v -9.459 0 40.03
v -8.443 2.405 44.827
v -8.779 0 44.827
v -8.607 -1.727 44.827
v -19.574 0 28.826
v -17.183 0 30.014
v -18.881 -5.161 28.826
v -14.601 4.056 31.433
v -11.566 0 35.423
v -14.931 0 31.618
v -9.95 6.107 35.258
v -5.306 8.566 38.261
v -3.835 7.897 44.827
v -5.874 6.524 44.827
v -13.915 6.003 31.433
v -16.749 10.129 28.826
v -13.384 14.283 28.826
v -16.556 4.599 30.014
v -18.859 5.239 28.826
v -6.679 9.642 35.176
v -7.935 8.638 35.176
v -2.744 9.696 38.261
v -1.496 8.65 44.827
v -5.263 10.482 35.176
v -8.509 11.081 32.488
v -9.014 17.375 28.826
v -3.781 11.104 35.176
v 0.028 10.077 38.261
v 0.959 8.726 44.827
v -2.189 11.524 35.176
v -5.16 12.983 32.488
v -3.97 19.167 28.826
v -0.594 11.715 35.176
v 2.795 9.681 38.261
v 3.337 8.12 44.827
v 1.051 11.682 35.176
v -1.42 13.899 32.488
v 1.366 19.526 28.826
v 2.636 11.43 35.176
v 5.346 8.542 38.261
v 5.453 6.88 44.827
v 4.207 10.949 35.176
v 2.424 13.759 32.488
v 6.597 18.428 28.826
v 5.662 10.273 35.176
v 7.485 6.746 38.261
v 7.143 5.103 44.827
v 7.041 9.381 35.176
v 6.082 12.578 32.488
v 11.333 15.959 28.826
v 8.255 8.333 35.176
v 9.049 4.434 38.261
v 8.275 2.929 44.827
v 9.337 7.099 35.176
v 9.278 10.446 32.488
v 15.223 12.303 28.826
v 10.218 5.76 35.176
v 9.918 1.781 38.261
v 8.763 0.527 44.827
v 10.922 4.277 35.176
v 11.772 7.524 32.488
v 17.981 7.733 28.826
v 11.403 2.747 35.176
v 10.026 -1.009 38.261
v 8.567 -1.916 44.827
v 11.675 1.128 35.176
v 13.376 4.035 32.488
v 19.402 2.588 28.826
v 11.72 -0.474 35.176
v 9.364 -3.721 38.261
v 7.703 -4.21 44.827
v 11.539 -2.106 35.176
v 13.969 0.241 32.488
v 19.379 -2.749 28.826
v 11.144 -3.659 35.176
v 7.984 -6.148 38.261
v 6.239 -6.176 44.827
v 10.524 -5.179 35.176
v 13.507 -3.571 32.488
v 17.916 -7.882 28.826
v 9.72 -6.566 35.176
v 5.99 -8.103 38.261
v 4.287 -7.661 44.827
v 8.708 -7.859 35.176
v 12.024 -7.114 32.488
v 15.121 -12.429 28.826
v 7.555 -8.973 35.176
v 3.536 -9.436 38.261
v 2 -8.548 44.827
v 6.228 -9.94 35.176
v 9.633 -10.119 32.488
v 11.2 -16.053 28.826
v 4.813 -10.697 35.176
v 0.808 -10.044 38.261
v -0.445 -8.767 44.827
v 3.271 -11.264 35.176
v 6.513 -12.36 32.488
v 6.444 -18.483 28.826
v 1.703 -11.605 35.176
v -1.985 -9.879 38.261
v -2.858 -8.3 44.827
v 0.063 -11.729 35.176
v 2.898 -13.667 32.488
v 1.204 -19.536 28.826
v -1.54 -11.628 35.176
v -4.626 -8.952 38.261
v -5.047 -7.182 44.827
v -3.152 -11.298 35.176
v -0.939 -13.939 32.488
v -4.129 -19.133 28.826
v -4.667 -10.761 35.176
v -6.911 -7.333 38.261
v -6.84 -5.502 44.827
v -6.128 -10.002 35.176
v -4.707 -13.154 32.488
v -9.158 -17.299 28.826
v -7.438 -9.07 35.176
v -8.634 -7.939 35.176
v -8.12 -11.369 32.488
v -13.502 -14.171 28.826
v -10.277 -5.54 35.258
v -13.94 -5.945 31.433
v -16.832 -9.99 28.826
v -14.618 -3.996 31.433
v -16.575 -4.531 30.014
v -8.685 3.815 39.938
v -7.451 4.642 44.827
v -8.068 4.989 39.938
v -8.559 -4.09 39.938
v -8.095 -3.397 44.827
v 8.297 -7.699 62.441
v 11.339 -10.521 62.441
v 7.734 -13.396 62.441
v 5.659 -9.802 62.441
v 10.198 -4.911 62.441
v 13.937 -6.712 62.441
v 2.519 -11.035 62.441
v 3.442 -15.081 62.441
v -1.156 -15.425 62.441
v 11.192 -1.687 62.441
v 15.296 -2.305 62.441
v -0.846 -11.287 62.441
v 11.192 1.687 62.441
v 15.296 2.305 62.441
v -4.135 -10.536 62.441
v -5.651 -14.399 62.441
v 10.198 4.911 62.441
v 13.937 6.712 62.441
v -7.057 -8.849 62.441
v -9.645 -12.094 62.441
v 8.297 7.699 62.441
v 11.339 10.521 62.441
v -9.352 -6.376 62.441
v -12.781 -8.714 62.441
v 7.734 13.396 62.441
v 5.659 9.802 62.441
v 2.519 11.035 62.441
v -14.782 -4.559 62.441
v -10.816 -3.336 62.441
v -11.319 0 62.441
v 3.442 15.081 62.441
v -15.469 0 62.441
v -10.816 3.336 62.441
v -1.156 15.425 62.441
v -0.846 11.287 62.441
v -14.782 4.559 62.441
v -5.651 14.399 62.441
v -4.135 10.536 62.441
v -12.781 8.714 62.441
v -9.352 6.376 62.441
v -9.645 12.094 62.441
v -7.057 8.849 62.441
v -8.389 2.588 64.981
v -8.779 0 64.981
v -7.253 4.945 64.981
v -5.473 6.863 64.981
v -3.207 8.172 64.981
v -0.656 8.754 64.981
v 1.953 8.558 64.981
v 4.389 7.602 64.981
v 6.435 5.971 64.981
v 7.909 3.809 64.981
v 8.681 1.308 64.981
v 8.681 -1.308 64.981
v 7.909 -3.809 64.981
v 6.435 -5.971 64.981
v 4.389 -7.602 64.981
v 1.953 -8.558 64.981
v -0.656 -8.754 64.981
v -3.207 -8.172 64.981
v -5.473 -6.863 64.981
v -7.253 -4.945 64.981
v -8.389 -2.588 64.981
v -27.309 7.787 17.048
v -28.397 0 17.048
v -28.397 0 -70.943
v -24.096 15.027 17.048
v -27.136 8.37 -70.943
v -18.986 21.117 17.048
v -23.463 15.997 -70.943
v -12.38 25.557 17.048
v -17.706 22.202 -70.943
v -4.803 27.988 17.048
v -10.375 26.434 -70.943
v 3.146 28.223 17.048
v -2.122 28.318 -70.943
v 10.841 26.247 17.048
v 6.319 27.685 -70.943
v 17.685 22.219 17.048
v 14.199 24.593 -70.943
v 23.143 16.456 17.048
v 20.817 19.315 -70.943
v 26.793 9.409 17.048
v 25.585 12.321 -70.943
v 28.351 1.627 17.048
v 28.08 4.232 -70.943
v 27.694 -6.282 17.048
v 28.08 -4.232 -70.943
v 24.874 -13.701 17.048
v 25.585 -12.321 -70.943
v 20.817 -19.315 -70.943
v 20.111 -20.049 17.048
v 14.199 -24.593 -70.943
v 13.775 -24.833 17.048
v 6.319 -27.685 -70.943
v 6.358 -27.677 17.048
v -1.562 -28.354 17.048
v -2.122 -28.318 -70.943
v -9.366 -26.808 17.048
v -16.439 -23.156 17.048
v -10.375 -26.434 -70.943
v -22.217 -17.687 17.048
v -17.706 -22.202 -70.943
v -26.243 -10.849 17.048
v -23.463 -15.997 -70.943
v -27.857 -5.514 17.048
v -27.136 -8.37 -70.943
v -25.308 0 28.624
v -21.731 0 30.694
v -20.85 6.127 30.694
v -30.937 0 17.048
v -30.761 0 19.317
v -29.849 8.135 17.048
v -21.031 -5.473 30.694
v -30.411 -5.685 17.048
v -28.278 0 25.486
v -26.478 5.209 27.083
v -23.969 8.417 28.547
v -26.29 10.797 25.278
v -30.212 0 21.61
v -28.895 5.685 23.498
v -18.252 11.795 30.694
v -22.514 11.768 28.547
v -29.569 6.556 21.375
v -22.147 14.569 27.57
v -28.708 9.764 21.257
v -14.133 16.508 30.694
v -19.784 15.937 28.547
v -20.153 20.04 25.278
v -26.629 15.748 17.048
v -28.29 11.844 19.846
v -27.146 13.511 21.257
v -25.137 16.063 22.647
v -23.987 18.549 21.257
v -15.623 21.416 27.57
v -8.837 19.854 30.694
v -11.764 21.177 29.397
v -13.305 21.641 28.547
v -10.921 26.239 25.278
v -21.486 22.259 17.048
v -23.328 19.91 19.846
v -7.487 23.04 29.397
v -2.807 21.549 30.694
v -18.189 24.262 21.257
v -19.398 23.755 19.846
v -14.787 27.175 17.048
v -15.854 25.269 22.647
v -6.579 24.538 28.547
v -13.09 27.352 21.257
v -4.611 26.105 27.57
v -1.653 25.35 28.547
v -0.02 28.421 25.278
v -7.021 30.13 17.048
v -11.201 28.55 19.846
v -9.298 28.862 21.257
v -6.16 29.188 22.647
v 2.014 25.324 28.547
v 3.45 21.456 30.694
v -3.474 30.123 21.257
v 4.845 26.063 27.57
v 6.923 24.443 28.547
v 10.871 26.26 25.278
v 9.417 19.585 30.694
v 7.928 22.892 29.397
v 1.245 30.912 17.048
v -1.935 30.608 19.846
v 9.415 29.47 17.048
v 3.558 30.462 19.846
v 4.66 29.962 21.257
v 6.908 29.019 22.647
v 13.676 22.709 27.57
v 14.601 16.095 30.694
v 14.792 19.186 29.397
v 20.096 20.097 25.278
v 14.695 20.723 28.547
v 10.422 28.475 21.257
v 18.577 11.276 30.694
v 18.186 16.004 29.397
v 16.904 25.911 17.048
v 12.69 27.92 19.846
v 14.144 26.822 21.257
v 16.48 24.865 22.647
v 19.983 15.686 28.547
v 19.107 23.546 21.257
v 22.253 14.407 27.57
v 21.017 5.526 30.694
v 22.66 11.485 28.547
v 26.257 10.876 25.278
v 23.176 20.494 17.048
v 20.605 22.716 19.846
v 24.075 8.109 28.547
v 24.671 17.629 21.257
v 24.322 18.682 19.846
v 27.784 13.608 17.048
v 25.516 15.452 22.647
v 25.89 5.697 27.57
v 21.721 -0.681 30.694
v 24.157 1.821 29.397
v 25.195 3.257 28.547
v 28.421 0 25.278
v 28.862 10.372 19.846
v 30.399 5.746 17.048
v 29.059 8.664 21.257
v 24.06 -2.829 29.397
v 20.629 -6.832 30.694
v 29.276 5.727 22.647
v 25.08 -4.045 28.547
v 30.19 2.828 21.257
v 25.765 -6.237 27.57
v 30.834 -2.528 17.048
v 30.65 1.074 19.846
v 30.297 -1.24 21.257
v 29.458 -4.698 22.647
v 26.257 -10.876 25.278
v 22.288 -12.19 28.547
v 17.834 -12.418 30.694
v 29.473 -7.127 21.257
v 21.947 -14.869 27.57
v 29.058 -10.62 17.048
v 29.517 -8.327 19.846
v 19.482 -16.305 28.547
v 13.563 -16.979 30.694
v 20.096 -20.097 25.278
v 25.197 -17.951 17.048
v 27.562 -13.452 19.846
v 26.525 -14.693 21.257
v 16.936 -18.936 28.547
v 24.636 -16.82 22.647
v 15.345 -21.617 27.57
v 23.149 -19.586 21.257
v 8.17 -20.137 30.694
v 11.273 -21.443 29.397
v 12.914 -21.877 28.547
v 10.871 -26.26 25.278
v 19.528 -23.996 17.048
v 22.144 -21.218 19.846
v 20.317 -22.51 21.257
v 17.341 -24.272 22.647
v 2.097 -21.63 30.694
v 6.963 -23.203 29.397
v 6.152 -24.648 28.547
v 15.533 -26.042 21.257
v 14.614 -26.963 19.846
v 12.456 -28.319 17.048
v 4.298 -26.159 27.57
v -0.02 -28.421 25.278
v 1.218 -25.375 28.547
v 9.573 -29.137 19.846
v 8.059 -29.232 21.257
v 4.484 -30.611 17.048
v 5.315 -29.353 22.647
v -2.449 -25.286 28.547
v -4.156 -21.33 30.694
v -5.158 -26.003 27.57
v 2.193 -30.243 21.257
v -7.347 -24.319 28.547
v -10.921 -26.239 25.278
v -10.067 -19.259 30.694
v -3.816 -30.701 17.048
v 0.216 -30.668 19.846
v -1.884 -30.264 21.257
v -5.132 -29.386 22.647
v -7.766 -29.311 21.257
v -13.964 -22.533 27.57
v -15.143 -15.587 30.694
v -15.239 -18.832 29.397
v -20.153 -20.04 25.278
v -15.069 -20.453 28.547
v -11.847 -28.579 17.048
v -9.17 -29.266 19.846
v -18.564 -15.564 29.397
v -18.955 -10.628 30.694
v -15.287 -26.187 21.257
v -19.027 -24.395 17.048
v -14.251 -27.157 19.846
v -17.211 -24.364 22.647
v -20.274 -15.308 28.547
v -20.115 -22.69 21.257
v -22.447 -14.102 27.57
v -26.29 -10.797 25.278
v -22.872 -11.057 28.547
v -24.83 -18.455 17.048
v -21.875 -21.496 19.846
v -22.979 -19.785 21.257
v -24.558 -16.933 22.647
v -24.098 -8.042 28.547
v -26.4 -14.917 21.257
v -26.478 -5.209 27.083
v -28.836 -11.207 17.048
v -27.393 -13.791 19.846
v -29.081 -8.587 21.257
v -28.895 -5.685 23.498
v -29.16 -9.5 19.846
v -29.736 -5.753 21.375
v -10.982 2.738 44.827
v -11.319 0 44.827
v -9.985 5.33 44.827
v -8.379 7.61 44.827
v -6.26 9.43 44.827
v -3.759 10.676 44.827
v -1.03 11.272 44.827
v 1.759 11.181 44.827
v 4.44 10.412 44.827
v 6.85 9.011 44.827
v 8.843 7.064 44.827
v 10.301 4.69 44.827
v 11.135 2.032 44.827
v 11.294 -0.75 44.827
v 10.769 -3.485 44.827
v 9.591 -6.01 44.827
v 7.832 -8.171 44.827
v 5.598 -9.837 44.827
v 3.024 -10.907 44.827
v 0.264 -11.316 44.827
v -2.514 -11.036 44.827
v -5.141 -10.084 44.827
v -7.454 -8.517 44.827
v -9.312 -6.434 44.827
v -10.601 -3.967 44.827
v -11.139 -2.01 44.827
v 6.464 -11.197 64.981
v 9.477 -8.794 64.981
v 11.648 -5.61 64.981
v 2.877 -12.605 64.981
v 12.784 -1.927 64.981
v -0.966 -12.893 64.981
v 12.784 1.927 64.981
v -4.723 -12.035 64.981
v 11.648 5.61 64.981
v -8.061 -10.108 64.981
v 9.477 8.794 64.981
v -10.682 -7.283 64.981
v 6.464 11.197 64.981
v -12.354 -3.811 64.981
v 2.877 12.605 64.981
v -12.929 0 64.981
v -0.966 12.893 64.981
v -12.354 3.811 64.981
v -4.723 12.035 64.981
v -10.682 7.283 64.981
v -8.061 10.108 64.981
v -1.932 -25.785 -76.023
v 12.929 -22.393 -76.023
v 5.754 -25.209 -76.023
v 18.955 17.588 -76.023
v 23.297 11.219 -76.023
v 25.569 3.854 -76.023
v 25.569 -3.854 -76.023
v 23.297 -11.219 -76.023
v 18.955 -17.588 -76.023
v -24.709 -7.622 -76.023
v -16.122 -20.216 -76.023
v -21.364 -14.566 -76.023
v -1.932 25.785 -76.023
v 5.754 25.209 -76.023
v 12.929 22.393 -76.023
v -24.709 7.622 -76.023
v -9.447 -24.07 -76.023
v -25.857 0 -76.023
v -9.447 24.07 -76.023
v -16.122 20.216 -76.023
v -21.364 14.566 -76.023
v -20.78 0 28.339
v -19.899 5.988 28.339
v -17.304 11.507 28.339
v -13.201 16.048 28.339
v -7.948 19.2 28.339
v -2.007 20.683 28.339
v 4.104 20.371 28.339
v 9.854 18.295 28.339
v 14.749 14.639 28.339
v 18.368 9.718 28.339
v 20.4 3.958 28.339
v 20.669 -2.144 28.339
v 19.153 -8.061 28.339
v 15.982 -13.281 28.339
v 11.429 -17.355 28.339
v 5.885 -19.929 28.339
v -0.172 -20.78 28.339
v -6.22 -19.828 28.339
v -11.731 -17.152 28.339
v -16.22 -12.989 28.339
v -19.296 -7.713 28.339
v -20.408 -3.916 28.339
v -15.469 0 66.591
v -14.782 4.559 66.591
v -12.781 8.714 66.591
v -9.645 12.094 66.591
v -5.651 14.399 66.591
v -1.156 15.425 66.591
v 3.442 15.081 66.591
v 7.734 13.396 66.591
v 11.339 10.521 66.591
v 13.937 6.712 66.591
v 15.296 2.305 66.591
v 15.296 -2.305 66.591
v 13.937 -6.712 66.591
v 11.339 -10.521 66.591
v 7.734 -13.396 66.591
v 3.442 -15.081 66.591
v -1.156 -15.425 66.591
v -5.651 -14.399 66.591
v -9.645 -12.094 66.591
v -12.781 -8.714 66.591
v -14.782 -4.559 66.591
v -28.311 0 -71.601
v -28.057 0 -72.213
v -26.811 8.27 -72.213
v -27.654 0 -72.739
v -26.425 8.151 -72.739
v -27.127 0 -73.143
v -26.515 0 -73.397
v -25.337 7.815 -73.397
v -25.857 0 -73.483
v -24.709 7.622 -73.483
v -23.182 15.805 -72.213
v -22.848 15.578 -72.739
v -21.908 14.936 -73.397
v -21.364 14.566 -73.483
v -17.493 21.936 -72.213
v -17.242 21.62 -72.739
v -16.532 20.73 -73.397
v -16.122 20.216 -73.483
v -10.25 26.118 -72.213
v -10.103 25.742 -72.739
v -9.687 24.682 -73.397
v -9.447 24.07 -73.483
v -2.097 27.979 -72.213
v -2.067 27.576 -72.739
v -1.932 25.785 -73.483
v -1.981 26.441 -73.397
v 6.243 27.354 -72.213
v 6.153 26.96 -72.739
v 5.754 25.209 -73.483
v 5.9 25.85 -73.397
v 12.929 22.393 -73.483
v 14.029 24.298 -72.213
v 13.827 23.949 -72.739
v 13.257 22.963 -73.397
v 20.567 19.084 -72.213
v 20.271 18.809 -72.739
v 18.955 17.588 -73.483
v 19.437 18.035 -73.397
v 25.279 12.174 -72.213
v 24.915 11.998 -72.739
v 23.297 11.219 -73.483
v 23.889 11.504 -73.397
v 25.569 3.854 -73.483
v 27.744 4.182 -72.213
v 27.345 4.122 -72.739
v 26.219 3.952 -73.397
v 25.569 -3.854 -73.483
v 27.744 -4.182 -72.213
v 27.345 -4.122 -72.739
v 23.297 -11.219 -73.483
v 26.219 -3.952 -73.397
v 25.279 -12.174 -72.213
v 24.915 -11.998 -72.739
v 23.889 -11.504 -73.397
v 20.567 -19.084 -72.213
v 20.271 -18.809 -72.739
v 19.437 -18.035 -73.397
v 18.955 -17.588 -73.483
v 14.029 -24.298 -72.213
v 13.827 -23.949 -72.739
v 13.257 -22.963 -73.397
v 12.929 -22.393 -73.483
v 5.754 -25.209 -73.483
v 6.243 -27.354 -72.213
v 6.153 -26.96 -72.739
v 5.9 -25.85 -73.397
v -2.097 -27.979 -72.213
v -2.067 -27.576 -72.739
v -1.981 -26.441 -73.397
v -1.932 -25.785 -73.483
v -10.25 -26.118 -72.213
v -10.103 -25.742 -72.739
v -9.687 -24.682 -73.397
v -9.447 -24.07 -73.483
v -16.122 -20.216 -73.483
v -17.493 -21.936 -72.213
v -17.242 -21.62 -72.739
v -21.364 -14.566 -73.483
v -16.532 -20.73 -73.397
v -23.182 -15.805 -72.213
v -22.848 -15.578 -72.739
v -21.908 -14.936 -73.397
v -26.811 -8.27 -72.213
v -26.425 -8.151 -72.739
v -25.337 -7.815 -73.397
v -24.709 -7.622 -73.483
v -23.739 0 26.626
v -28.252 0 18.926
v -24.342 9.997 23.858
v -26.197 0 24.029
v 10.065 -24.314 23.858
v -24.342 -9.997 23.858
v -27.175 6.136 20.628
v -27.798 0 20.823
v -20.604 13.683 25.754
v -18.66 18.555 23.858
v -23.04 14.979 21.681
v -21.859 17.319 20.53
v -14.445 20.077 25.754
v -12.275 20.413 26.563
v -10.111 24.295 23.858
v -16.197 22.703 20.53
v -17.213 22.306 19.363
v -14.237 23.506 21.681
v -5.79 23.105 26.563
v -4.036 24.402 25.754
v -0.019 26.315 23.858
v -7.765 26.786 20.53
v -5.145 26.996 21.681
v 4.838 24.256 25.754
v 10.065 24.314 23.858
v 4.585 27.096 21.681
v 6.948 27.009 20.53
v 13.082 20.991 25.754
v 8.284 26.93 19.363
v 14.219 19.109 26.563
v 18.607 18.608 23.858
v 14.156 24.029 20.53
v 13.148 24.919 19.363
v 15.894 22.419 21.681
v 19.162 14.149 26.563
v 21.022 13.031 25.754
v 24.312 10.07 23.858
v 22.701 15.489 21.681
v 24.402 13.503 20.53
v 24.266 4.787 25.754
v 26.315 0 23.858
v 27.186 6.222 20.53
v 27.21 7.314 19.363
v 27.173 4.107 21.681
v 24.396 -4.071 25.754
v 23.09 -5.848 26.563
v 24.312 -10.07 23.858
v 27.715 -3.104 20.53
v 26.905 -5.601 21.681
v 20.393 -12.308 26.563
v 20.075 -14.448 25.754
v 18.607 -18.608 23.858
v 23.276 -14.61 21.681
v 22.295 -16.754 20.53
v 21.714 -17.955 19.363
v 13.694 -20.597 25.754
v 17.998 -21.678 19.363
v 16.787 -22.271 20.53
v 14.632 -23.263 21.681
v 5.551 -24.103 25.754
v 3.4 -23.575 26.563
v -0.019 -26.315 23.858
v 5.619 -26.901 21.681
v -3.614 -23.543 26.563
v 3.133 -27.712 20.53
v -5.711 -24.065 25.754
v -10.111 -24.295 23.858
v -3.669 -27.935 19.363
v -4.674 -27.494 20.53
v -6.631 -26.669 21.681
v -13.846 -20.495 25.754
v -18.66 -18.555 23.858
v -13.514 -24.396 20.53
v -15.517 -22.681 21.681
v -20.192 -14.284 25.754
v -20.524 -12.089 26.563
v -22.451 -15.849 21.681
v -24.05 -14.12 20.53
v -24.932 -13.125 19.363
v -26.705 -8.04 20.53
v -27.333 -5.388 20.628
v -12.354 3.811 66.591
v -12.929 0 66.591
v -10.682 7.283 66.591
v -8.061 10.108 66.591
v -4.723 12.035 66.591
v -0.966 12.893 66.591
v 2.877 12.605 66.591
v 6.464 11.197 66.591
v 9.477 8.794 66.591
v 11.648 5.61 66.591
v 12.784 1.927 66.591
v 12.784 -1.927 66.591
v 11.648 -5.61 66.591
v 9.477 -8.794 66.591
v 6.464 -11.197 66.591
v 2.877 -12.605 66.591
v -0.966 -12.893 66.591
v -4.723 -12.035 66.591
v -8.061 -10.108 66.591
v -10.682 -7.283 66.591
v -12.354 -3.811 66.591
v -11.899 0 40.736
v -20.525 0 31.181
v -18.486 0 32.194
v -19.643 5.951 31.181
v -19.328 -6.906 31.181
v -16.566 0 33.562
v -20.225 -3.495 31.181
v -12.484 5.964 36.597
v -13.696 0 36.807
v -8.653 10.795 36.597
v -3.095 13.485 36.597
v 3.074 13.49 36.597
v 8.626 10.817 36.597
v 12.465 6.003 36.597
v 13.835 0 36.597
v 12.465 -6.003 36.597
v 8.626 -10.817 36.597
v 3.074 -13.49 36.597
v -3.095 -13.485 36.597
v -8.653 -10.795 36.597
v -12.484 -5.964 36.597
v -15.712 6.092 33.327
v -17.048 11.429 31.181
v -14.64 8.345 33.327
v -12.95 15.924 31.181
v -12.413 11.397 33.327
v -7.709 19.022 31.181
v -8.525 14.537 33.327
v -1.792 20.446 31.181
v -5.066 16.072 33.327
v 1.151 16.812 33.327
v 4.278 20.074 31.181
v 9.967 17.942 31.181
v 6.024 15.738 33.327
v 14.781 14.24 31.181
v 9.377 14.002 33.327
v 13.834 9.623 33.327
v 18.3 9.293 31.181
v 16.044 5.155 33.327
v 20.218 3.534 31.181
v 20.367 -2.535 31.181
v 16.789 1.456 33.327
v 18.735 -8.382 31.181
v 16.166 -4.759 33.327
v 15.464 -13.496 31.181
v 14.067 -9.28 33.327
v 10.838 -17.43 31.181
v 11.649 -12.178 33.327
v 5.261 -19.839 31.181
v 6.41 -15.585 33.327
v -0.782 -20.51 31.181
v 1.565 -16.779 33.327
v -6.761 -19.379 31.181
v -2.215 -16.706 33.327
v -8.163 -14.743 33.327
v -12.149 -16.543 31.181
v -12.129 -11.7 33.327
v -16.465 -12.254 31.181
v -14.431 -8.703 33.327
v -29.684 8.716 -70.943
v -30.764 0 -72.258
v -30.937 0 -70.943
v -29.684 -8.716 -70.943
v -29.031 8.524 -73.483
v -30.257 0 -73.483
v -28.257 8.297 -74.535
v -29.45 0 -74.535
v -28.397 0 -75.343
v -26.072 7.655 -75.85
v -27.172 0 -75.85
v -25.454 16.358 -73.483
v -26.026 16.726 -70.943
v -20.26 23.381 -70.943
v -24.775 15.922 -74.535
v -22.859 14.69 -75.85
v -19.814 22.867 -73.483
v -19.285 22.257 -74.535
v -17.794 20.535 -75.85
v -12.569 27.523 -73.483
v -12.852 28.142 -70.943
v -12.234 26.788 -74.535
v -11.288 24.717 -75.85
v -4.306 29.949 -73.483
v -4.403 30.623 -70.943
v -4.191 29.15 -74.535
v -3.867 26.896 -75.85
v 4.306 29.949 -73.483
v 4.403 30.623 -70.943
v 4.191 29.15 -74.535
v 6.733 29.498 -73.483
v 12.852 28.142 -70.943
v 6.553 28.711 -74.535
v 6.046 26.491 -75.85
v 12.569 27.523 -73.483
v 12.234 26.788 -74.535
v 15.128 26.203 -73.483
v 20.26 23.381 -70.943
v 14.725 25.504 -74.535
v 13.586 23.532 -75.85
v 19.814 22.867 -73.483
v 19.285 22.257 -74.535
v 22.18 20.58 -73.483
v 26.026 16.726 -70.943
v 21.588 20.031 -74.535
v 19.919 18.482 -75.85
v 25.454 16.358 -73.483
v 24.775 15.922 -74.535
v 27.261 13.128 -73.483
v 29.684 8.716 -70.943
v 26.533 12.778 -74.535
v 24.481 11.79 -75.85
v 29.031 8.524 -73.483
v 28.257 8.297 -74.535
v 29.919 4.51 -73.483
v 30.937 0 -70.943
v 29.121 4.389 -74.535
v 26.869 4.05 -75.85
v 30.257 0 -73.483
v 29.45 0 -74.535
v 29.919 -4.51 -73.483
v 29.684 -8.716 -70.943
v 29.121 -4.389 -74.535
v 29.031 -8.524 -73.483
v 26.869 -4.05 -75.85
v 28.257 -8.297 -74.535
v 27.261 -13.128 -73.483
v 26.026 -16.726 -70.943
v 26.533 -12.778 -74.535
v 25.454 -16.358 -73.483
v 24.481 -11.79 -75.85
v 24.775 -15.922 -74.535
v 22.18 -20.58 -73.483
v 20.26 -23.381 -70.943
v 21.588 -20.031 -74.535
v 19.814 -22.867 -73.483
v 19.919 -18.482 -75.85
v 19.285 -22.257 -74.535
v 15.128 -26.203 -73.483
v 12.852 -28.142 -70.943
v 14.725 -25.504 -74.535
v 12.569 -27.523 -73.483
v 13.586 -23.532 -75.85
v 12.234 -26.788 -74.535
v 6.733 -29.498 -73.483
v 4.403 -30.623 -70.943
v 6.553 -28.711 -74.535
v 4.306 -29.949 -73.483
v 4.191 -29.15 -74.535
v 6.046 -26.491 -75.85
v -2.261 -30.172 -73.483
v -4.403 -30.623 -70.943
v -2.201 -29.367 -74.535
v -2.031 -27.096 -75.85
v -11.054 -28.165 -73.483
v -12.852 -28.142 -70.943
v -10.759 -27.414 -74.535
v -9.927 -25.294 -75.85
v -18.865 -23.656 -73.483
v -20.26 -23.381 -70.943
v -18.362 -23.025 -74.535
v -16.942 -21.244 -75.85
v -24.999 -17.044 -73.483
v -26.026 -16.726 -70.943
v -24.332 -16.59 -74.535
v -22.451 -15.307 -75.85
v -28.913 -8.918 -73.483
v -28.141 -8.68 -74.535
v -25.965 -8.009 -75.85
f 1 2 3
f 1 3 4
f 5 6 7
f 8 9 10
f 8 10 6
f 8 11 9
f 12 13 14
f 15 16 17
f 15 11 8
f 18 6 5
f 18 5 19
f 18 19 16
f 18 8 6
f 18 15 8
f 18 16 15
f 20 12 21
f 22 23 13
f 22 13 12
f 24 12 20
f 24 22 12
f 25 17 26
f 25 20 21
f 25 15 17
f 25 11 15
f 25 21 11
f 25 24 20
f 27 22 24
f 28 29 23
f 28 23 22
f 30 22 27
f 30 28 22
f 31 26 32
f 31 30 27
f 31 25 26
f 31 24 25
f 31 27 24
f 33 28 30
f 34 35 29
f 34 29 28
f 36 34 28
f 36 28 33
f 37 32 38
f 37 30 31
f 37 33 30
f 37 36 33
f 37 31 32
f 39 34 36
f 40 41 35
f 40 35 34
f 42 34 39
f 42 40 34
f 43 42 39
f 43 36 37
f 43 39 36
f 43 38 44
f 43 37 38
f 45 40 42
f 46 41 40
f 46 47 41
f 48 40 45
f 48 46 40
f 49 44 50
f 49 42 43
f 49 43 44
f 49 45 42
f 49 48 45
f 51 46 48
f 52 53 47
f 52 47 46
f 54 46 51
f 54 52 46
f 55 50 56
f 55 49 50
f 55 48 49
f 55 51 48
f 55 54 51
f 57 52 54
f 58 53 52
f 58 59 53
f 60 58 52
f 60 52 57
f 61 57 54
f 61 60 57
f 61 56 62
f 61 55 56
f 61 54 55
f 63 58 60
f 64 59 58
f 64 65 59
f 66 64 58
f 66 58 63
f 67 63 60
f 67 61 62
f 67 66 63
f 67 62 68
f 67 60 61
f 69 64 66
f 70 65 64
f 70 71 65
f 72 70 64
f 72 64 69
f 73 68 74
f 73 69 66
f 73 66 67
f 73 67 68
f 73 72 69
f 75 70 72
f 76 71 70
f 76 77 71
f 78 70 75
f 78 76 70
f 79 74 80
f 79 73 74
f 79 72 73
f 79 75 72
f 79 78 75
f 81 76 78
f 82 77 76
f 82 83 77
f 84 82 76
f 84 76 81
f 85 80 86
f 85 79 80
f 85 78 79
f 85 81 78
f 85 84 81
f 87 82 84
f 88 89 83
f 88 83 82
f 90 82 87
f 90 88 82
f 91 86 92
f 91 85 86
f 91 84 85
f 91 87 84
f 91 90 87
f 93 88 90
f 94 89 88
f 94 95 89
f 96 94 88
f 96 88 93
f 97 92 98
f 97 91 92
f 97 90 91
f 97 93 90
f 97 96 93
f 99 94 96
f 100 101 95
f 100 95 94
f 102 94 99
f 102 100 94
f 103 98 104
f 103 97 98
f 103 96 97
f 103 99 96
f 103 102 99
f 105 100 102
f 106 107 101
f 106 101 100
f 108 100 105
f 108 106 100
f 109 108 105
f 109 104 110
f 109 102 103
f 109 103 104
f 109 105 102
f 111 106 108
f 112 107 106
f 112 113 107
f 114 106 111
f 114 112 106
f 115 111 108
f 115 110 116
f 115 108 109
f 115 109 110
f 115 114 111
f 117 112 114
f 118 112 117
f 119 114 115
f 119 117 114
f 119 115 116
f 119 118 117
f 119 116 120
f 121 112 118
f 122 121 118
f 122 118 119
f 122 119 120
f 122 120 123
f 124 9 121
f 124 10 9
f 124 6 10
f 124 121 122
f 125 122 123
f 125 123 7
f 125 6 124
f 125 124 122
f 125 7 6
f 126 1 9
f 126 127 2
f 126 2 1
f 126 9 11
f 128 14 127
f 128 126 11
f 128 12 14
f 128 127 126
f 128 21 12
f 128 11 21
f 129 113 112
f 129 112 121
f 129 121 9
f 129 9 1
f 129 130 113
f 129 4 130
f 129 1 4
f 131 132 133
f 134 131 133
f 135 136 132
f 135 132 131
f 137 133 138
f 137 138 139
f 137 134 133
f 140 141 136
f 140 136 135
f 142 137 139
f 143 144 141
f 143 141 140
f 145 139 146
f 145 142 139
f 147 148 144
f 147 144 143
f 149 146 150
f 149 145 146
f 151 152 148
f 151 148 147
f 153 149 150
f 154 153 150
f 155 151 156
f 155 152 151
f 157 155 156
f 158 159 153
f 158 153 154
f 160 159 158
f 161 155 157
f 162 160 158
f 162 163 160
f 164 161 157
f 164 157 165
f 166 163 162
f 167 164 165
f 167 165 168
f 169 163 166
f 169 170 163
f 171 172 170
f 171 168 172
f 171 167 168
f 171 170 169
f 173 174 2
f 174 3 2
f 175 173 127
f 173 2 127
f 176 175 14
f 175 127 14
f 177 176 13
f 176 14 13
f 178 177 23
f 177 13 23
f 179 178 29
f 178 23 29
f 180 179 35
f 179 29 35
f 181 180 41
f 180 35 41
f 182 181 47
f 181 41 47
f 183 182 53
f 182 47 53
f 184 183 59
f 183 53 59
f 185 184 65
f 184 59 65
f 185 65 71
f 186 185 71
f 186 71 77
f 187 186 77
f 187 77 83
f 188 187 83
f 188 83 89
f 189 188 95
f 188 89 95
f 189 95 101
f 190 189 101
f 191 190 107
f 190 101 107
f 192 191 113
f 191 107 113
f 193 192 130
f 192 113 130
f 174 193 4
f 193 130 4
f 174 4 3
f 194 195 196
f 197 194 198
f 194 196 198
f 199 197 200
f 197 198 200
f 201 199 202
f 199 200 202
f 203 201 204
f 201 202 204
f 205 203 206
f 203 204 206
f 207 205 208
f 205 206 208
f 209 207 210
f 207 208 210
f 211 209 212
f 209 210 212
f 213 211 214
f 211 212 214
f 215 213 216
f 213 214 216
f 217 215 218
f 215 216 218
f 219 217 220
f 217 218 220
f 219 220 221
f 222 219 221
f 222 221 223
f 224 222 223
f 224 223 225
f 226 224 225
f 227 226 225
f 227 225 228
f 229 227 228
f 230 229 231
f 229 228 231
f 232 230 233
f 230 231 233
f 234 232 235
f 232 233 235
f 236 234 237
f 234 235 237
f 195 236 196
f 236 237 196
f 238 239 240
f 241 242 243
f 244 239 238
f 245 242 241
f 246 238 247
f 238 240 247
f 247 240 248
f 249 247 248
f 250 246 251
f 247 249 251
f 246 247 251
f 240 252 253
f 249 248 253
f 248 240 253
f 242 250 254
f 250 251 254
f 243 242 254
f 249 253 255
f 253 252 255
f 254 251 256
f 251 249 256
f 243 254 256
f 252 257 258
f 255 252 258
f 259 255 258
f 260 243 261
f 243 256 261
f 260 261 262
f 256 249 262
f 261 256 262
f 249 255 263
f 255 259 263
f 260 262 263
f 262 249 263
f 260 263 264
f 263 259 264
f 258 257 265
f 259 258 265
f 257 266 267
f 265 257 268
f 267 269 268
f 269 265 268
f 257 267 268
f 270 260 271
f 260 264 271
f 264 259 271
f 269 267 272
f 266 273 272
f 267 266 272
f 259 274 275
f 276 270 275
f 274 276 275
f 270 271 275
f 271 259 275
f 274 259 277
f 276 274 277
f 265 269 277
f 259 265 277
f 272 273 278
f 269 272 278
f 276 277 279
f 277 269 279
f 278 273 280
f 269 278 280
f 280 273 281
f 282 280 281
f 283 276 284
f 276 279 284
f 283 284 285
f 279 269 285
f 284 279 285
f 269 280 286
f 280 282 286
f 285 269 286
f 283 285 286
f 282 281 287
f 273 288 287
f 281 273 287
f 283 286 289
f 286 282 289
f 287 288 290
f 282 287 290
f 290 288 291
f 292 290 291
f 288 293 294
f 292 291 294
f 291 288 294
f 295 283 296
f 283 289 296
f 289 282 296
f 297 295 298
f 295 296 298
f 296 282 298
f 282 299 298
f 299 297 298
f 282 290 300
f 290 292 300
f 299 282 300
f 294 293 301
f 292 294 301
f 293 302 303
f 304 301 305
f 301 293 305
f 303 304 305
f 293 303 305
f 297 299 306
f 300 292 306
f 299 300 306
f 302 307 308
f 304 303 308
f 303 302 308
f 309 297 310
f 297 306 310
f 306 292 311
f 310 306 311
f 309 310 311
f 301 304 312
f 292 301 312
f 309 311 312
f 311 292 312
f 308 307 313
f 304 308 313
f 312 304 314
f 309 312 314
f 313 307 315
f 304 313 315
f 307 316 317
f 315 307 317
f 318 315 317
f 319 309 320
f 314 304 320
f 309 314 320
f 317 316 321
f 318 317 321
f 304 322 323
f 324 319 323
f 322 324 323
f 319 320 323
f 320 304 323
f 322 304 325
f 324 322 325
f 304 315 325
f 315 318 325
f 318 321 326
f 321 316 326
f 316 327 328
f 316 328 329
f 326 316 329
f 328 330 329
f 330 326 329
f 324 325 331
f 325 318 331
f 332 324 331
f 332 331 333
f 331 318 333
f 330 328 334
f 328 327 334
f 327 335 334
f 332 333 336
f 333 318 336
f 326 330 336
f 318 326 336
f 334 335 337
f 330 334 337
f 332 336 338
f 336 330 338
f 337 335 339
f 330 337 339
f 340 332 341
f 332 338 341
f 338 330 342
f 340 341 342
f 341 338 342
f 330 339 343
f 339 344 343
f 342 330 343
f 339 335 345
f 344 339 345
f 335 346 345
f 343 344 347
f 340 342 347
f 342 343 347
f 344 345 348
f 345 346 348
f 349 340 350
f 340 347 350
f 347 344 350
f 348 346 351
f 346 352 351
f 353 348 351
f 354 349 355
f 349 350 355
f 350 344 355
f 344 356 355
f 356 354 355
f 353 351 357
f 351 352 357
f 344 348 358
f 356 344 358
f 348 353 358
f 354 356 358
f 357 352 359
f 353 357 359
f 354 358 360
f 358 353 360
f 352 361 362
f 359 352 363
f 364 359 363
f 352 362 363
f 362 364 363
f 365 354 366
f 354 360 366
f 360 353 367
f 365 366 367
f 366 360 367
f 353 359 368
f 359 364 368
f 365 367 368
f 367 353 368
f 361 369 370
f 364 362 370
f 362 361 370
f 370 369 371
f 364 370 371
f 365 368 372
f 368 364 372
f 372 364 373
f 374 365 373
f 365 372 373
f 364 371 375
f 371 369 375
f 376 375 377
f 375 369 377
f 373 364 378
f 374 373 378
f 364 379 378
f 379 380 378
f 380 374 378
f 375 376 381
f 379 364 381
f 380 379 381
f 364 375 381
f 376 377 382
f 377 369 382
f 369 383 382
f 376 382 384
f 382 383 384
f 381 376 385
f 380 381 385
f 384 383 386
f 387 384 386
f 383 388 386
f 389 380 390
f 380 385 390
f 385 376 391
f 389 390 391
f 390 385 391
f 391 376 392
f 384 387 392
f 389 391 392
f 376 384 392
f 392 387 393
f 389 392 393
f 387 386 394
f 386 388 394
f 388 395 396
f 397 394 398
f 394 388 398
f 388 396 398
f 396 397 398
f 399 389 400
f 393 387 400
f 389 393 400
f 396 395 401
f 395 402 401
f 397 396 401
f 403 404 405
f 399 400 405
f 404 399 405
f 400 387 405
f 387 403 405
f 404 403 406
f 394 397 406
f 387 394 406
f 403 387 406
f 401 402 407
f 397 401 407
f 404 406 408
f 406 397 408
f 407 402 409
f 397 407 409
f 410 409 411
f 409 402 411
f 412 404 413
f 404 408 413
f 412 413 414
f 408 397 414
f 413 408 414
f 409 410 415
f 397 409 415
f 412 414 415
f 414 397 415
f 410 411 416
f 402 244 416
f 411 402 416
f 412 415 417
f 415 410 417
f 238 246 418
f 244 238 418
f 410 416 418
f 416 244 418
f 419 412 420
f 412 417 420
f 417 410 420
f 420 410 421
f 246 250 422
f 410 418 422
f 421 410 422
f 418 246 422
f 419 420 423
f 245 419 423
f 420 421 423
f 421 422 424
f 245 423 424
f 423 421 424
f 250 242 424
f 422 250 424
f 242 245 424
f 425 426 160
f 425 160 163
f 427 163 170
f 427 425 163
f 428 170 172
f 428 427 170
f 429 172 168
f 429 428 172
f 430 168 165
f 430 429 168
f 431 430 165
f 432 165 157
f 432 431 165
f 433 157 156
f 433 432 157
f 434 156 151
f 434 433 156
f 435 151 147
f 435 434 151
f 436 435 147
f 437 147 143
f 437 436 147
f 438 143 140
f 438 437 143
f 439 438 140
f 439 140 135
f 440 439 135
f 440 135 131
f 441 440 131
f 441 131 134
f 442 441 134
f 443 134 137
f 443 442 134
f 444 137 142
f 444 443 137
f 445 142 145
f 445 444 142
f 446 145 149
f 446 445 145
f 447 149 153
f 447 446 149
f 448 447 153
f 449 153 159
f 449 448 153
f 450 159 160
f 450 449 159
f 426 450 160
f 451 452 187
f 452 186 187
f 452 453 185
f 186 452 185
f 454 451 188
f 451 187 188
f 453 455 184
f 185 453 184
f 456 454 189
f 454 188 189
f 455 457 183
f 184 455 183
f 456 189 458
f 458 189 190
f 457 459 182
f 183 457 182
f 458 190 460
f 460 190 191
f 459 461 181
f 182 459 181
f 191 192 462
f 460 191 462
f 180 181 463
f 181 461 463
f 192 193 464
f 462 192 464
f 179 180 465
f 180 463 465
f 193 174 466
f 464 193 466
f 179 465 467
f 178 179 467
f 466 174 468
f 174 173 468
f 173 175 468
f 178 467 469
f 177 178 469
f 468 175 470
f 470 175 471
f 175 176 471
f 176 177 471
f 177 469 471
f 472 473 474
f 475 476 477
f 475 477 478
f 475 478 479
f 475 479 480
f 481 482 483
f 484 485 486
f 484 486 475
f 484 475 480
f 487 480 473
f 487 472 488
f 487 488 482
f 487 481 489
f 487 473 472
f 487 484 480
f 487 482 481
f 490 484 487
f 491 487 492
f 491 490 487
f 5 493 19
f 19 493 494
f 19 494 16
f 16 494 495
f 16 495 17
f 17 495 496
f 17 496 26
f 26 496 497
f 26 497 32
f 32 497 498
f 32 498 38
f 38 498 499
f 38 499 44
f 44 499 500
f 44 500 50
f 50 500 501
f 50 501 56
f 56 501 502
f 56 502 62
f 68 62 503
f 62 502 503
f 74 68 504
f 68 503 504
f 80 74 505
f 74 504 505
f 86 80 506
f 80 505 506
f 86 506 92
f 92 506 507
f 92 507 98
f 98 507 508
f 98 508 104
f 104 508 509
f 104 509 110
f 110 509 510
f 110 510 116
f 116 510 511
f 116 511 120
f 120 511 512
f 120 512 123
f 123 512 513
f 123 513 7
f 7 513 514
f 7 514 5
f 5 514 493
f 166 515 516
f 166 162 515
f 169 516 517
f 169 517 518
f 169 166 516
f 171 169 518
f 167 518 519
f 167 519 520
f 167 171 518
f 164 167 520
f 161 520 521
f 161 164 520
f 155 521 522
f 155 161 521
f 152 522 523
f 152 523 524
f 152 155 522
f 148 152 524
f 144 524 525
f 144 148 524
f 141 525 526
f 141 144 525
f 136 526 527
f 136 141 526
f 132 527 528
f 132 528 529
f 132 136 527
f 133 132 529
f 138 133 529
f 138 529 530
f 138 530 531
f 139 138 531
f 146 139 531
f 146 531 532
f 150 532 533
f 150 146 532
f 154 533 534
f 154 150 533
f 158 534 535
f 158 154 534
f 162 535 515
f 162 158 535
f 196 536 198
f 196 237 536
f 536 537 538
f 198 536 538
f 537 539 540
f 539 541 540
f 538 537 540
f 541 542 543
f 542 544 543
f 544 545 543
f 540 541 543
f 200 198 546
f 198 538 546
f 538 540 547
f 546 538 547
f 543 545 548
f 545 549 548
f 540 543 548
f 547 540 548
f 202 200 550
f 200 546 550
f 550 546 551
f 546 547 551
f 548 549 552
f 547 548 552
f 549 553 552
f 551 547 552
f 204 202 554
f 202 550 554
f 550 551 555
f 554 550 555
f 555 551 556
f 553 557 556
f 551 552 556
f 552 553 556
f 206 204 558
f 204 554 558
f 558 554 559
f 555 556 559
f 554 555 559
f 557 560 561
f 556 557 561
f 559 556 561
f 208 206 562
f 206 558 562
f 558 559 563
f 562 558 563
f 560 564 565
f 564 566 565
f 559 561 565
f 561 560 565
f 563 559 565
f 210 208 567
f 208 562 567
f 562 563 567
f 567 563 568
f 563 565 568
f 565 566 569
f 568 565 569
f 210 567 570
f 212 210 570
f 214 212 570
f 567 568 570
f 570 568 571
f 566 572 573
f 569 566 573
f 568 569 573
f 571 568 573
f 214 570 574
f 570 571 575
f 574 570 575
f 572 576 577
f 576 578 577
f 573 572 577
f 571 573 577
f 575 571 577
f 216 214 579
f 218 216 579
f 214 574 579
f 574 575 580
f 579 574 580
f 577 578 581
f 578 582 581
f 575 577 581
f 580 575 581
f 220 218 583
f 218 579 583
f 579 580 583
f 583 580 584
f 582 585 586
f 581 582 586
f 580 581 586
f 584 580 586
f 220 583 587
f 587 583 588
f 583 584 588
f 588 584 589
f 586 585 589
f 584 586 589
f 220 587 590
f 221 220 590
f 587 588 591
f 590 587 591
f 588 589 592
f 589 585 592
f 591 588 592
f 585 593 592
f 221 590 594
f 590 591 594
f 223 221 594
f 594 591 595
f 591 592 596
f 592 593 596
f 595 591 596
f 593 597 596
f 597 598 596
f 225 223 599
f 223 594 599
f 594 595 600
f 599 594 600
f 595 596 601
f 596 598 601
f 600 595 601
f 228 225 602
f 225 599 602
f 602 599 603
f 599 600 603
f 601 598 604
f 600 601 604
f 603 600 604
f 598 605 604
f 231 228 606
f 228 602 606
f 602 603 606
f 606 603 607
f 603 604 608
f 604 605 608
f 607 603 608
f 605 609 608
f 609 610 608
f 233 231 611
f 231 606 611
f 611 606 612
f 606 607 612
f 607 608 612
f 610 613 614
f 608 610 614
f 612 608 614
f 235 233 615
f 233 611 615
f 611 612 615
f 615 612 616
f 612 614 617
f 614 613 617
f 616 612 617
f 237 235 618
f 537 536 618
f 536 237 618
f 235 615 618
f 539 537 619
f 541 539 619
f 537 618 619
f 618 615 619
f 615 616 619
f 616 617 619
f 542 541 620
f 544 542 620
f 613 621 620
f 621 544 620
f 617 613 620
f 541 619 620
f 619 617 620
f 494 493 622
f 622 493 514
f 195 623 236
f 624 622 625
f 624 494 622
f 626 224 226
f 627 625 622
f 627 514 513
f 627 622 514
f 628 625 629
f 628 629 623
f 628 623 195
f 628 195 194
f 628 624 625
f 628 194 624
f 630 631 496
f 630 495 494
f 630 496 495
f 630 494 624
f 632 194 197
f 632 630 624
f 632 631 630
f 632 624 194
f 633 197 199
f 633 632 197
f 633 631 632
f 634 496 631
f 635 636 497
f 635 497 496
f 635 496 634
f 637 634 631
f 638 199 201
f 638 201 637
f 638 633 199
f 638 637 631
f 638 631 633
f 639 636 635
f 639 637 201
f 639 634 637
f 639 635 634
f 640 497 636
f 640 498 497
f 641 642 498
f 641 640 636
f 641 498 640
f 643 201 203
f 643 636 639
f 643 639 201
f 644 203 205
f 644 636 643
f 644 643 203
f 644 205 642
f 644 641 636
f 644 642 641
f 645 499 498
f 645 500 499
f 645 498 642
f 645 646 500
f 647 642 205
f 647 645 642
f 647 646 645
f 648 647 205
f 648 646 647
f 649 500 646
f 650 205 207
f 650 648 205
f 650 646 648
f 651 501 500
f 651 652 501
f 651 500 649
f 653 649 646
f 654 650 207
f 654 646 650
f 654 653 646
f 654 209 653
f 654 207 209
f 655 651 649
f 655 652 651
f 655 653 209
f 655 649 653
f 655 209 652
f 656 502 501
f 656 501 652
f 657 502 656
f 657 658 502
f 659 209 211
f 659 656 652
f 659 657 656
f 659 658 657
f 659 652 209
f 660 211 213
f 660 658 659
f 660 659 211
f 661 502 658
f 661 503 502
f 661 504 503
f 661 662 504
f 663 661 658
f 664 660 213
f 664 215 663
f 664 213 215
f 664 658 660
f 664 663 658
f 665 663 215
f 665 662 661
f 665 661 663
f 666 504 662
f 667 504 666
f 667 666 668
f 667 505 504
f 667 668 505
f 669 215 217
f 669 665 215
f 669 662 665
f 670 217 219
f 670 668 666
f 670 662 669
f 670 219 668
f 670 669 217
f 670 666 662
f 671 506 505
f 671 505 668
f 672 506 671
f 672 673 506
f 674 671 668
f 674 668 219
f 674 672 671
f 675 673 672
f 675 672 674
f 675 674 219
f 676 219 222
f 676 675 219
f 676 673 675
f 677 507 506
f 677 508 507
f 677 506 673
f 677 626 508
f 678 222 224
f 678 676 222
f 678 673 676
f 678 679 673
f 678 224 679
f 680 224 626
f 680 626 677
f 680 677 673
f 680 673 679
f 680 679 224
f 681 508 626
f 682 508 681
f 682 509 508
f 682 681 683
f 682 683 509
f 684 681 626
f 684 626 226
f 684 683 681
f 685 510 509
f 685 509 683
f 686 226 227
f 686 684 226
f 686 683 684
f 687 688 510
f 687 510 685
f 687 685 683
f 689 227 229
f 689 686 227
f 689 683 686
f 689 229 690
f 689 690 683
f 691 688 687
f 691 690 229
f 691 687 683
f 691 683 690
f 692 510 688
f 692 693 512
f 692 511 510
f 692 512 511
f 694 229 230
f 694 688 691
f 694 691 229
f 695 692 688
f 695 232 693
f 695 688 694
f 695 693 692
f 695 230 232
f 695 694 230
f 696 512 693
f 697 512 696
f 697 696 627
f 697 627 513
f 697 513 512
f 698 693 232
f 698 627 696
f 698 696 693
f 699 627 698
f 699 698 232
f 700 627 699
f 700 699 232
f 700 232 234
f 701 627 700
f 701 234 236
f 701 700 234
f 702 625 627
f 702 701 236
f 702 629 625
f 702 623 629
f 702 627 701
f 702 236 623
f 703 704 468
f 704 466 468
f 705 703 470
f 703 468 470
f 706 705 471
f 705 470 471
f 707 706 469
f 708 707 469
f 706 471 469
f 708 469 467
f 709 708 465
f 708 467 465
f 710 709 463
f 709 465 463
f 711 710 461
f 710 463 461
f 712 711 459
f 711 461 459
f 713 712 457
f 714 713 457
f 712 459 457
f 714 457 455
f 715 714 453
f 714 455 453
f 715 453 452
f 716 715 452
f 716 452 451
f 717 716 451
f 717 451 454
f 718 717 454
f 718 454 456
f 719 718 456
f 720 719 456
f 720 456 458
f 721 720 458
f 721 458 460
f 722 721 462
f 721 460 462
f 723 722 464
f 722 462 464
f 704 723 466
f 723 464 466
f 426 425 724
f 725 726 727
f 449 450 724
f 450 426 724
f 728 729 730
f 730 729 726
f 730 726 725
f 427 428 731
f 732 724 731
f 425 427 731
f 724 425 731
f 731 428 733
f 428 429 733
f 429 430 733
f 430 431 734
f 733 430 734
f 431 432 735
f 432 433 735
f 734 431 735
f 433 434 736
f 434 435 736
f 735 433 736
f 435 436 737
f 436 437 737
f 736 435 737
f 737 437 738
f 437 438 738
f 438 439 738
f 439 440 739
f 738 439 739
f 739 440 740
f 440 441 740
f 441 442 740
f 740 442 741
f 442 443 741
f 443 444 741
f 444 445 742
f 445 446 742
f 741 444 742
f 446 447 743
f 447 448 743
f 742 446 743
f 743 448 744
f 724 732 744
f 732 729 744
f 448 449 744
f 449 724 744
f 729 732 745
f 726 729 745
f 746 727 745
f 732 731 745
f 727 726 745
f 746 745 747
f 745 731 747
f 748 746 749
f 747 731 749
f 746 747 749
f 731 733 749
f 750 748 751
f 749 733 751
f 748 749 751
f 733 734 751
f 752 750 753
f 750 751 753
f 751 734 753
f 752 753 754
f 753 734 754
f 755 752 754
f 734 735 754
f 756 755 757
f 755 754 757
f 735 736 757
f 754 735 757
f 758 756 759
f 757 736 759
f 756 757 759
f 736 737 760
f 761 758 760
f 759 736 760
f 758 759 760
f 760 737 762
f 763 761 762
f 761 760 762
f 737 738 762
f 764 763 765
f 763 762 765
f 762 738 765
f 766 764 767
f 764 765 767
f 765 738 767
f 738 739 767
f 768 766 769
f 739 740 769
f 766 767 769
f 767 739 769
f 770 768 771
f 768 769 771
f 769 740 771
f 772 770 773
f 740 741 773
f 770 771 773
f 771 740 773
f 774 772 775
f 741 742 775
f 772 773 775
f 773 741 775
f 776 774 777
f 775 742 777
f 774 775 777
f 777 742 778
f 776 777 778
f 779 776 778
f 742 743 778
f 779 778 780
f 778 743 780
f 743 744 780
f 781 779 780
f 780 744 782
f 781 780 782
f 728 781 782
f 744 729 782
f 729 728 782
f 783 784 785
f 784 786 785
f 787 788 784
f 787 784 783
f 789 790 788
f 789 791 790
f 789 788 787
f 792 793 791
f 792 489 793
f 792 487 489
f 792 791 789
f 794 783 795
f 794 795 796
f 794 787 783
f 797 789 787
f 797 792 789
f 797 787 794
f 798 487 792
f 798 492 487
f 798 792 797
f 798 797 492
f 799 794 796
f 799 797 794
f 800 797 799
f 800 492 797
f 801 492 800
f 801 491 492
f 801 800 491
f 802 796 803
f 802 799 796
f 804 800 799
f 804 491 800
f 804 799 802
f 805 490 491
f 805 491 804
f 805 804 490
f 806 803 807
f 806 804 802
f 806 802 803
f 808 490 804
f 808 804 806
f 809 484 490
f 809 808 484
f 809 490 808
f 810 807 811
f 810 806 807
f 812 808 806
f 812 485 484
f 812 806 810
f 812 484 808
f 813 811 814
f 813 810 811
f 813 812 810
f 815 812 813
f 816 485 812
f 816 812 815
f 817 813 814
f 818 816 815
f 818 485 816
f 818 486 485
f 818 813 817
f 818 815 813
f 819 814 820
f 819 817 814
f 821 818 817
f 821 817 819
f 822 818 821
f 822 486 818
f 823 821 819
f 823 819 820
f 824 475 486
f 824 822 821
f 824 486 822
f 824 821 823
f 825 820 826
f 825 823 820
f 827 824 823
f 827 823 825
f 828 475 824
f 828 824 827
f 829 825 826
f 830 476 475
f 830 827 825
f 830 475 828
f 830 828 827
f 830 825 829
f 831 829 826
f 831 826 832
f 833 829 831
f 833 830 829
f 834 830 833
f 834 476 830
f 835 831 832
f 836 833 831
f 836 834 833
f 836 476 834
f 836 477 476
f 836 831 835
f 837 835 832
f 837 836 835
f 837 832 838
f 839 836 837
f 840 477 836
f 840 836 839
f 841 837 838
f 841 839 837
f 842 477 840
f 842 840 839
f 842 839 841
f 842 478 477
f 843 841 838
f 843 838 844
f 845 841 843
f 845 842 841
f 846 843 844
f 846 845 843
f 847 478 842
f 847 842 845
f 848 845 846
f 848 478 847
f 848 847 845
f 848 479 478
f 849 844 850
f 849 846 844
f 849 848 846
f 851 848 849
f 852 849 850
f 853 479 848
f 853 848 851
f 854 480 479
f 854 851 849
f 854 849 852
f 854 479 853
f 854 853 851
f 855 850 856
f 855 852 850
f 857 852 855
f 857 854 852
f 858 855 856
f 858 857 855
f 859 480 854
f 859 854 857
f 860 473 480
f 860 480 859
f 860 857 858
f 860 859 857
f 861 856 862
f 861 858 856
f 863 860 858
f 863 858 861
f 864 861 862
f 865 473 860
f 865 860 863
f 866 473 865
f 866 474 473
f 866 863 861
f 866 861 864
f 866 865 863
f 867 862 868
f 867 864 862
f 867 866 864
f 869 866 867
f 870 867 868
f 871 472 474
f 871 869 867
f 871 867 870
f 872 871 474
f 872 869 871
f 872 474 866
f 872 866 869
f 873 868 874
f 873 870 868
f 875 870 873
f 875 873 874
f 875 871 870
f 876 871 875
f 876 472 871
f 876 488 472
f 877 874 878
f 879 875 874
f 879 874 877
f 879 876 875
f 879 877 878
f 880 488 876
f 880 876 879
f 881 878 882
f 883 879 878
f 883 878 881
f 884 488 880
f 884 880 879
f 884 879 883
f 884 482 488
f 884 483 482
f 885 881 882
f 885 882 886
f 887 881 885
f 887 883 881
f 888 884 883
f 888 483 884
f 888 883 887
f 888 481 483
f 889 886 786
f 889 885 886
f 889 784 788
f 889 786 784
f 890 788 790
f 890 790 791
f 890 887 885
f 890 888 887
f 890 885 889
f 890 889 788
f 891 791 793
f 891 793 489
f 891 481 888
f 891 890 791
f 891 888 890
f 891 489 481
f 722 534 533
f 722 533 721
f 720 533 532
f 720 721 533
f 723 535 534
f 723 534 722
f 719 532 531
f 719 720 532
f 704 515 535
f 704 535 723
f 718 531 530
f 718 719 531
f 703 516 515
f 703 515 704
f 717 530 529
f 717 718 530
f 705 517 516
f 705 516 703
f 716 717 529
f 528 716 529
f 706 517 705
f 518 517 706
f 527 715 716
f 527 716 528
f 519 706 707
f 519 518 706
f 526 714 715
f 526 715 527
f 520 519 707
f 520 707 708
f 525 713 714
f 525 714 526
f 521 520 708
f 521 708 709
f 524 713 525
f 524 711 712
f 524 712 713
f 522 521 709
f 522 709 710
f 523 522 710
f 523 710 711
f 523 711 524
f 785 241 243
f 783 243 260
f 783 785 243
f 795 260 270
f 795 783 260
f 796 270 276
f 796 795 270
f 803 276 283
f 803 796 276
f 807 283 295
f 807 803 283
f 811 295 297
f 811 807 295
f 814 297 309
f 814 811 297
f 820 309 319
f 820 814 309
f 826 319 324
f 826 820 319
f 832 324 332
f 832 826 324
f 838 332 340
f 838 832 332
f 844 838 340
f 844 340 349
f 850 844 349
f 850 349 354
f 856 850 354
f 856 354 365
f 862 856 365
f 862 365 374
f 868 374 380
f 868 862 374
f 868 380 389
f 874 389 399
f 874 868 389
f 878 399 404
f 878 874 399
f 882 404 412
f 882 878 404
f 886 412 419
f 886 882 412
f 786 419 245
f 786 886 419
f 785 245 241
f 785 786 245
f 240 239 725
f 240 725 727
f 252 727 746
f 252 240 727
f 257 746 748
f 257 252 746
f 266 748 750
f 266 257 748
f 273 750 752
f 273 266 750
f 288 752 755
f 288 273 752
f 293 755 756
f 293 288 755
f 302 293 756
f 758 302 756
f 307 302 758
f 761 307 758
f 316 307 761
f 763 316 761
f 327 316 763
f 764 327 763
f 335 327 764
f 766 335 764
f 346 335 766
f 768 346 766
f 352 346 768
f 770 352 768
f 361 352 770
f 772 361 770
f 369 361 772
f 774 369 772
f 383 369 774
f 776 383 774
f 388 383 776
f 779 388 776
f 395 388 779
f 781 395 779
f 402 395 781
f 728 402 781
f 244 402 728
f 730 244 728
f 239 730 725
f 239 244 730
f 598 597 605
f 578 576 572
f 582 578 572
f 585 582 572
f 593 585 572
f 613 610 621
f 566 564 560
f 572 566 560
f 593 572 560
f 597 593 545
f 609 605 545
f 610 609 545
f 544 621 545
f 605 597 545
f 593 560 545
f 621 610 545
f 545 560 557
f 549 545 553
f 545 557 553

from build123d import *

# Parameters (mm, degrees)
F2_R = 14.7170458762
F3_R = 5.08
F4_T = -2.54


with BuildPart() as f1:
    # F0 (on Front) → F1 (revolve)
    with BuildSketch(Plane.XZ):
        Polygon((0, -76.023183763), (0, 66.5910243988), (-15.4687426984, 66.5910243988), (-15.4687426984, 62.4408759177), (-11.3185923547, 62.4408759177), (-11.3185923547, 34.8989777267), (-30.9374798089, 26.9759688526), (-30.9374798089, -76.023183763), align=None)
    revolve(axis=Axis((0, 0, -4.7160796821), (0, 0, -1)))

    # F2
    f2_edges = [f1.edges().sort_by_distance(p)[0] for p in [
        (30.93748, 0, 26.975969),
        (11.318592, 0, 34.898978),
    ]]
    fillet(f2_edges, radius=F2_R)

    # F3
    f3_edges = [f1.edges().sort_by_distance(p)[0] for p in [
        (30.93748, 0, -76.023184),
    ]]
    fillet(f3_edges, radius=F3_R)

    # F4
    f4_openings = [f1.faces().sort_by_distance(p)[0] for p in [
        (0, 0, 66.591024),
    ]]
    offset(amount=F4_T, openings=f4_openings, kind=Kind.INTERSECTION)


solid = f1.part
